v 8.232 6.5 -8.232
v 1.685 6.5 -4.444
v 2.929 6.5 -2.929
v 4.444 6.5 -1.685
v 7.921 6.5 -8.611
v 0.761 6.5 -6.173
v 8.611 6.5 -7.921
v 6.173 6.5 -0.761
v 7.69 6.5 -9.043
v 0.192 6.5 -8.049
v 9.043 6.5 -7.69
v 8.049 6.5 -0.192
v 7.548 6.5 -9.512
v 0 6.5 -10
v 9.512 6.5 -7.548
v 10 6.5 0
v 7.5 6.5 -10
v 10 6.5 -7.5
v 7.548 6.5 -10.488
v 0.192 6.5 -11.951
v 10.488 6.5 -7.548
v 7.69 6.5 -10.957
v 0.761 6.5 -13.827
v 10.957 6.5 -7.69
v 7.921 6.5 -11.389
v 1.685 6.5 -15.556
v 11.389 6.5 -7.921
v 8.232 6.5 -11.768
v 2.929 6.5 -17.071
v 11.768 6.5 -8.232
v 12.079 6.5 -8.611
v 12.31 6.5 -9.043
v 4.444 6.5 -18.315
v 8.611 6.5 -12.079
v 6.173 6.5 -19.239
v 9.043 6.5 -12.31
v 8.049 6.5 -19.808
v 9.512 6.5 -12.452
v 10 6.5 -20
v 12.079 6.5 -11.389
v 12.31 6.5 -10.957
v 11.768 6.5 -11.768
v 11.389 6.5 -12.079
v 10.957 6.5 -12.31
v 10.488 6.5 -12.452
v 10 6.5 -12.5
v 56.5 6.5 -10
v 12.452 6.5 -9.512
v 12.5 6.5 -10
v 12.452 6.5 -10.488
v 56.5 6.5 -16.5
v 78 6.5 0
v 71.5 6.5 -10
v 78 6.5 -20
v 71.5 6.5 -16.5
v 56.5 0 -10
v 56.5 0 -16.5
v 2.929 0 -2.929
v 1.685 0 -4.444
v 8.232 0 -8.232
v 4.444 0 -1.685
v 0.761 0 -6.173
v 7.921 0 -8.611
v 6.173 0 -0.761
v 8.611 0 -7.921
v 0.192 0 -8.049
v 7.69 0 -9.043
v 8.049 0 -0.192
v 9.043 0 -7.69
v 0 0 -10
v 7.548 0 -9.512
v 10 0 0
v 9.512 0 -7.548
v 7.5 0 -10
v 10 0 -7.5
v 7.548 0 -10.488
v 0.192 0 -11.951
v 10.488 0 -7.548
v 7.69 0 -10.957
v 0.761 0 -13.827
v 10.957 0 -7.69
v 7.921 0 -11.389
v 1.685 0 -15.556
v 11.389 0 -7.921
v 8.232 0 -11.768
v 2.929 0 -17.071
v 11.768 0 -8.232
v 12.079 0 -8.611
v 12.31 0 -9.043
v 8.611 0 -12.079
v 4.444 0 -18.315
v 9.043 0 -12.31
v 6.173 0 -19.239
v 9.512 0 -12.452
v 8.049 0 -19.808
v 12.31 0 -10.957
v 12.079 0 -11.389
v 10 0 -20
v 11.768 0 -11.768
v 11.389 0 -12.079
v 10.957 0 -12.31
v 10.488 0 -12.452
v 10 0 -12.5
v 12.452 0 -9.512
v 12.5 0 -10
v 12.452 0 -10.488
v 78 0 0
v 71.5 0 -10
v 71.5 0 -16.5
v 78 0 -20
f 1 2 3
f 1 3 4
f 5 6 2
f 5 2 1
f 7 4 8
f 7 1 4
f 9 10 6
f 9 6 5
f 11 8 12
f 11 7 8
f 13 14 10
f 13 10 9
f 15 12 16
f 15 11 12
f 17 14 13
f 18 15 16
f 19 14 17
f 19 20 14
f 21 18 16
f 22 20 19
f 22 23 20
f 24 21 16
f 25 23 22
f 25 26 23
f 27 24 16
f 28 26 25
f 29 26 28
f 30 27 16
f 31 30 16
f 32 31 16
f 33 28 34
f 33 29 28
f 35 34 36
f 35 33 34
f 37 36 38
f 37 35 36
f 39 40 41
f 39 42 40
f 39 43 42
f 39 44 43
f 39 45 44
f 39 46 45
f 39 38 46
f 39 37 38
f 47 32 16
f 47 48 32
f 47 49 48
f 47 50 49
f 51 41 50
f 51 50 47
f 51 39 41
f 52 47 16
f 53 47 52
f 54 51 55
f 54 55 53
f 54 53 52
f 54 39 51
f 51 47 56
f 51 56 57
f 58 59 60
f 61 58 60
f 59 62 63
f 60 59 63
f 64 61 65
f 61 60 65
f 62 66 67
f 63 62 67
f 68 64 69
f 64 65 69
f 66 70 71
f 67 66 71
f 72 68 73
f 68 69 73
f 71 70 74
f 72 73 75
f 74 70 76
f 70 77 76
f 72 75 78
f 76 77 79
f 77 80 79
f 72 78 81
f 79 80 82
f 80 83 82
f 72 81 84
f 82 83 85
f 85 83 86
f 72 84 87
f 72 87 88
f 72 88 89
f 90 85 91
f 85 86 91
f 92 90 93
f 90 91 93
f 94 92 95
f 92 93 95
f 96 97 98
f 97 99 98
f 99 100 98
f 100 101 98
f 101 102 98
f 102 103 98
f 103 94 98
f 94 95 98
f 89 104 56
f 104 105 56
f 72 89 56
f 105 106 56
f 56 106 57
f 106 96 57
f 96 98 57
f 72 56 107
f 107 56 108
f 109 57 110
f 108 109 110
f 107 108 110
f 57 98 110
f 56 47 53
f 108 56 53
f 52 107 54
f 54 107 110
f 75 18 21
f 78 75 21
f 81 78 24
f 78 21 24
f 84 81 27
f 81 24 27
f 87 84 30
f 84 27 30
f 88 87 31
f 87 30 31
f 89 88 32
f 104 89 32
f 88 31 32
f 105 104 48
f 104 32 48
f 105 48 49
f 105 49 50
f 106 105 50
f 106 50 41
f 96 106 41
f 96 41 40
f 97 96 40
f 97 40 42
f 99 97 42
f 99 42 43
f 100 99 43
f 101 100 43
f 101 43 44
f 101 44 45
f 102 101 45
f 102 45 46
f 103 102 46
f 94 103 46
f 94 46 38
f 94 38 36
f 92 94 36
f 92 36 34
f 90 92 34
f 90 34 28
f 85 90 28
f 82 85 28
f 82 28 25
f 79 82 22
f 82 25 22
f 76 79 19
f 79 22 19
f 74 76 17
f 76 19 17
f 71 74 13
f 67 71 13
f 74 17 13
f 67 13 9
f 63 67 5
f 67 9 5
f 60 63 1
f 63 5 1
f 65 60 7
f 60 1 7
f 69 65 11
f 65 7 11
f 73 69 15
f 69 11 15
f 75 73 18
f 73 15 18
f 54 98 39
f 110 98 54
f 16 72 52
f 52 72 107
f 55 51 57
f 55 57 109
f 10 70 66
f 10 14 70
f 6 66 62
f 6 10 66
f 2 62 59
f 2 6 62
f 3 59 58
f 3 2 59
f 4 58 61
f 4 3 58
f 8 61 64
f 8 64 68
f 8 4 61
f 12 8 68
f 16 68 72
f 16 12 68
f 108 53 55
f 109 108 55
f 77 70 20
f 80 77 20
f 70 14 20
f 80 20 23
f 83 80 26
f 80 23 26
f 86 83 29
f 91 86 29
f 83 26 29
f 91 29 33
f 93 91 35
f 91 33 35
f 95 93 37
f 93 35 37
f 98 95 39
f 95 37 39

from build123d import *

# Parameters (mm, degrees)
SKETCH1_W           = 78
SKETCH1_H           = 20
BOSS_EXTRUDE1_DEPTH = 6.5
SKETCH2_R           = 2.5
CUT_EXTRUDE1_DEPTH  = 81.785209042
SKETCH3_W           = 15
SKETCH3_H           = 6.5
CUT_EXTRUDE2_DEPTH  = 81.785209042
FILLET1_R           = 10


with BuildPart() as part:
    # Sketch1 → Boss-Extrude1 (new body)
    with BuildSketch(Plane(origin=(0, 0, 0), x_dir=(1, 0, 0), z_dir=(0, 1, 0))):
        with Locations((39, 10)):
            Rectangle(SKETCH1_W, SKETCH1_H)
    extrude(amount=BOSS_EXTRUDE1_DEPTH)

    # Sketch2 → Cut-Extrude1 (cut, through all)
    with BuildSketch(Plane(origin=(0, 6.5, 0), x_dir=(1, 0, 0), z_dir=(0, 1, 0))):
        with Locations(Location((10, 10, 0), (0, 0, 270))):
            Circle(SKETCH2_R)
    extrude(amount=-CUT_EXTRUDE1_DEPTH, mode=Mode.SUBTRACT)

    # Sketch3 → Cut-Extrude2 (cut, through all)
    with BuildSketch(Plane(origin=(0, 6.5, 0), x_dir=(1, 0, 0), z_dir=(0, 1, 0))):
        with Locations((64, 13.25)):
            Rectangle(SKETCH3_W, SKETCH3_H)
    extrude(amount=-CUT_EXTRUDE2_DEPTH, mode=Mode.SUBTRACT)

    # Fillet1
    fillet1_edges = [part.edges().sort_by_distance(p)[0] for p in [
        (0, 3.25, 0),
        (0, 3.25, -20),
    ]]
    fillet(fillet1_edges, radius=FILLET1_R - 0.0001)  # a hair under: the kernel refuses the full size


solid = part.part
